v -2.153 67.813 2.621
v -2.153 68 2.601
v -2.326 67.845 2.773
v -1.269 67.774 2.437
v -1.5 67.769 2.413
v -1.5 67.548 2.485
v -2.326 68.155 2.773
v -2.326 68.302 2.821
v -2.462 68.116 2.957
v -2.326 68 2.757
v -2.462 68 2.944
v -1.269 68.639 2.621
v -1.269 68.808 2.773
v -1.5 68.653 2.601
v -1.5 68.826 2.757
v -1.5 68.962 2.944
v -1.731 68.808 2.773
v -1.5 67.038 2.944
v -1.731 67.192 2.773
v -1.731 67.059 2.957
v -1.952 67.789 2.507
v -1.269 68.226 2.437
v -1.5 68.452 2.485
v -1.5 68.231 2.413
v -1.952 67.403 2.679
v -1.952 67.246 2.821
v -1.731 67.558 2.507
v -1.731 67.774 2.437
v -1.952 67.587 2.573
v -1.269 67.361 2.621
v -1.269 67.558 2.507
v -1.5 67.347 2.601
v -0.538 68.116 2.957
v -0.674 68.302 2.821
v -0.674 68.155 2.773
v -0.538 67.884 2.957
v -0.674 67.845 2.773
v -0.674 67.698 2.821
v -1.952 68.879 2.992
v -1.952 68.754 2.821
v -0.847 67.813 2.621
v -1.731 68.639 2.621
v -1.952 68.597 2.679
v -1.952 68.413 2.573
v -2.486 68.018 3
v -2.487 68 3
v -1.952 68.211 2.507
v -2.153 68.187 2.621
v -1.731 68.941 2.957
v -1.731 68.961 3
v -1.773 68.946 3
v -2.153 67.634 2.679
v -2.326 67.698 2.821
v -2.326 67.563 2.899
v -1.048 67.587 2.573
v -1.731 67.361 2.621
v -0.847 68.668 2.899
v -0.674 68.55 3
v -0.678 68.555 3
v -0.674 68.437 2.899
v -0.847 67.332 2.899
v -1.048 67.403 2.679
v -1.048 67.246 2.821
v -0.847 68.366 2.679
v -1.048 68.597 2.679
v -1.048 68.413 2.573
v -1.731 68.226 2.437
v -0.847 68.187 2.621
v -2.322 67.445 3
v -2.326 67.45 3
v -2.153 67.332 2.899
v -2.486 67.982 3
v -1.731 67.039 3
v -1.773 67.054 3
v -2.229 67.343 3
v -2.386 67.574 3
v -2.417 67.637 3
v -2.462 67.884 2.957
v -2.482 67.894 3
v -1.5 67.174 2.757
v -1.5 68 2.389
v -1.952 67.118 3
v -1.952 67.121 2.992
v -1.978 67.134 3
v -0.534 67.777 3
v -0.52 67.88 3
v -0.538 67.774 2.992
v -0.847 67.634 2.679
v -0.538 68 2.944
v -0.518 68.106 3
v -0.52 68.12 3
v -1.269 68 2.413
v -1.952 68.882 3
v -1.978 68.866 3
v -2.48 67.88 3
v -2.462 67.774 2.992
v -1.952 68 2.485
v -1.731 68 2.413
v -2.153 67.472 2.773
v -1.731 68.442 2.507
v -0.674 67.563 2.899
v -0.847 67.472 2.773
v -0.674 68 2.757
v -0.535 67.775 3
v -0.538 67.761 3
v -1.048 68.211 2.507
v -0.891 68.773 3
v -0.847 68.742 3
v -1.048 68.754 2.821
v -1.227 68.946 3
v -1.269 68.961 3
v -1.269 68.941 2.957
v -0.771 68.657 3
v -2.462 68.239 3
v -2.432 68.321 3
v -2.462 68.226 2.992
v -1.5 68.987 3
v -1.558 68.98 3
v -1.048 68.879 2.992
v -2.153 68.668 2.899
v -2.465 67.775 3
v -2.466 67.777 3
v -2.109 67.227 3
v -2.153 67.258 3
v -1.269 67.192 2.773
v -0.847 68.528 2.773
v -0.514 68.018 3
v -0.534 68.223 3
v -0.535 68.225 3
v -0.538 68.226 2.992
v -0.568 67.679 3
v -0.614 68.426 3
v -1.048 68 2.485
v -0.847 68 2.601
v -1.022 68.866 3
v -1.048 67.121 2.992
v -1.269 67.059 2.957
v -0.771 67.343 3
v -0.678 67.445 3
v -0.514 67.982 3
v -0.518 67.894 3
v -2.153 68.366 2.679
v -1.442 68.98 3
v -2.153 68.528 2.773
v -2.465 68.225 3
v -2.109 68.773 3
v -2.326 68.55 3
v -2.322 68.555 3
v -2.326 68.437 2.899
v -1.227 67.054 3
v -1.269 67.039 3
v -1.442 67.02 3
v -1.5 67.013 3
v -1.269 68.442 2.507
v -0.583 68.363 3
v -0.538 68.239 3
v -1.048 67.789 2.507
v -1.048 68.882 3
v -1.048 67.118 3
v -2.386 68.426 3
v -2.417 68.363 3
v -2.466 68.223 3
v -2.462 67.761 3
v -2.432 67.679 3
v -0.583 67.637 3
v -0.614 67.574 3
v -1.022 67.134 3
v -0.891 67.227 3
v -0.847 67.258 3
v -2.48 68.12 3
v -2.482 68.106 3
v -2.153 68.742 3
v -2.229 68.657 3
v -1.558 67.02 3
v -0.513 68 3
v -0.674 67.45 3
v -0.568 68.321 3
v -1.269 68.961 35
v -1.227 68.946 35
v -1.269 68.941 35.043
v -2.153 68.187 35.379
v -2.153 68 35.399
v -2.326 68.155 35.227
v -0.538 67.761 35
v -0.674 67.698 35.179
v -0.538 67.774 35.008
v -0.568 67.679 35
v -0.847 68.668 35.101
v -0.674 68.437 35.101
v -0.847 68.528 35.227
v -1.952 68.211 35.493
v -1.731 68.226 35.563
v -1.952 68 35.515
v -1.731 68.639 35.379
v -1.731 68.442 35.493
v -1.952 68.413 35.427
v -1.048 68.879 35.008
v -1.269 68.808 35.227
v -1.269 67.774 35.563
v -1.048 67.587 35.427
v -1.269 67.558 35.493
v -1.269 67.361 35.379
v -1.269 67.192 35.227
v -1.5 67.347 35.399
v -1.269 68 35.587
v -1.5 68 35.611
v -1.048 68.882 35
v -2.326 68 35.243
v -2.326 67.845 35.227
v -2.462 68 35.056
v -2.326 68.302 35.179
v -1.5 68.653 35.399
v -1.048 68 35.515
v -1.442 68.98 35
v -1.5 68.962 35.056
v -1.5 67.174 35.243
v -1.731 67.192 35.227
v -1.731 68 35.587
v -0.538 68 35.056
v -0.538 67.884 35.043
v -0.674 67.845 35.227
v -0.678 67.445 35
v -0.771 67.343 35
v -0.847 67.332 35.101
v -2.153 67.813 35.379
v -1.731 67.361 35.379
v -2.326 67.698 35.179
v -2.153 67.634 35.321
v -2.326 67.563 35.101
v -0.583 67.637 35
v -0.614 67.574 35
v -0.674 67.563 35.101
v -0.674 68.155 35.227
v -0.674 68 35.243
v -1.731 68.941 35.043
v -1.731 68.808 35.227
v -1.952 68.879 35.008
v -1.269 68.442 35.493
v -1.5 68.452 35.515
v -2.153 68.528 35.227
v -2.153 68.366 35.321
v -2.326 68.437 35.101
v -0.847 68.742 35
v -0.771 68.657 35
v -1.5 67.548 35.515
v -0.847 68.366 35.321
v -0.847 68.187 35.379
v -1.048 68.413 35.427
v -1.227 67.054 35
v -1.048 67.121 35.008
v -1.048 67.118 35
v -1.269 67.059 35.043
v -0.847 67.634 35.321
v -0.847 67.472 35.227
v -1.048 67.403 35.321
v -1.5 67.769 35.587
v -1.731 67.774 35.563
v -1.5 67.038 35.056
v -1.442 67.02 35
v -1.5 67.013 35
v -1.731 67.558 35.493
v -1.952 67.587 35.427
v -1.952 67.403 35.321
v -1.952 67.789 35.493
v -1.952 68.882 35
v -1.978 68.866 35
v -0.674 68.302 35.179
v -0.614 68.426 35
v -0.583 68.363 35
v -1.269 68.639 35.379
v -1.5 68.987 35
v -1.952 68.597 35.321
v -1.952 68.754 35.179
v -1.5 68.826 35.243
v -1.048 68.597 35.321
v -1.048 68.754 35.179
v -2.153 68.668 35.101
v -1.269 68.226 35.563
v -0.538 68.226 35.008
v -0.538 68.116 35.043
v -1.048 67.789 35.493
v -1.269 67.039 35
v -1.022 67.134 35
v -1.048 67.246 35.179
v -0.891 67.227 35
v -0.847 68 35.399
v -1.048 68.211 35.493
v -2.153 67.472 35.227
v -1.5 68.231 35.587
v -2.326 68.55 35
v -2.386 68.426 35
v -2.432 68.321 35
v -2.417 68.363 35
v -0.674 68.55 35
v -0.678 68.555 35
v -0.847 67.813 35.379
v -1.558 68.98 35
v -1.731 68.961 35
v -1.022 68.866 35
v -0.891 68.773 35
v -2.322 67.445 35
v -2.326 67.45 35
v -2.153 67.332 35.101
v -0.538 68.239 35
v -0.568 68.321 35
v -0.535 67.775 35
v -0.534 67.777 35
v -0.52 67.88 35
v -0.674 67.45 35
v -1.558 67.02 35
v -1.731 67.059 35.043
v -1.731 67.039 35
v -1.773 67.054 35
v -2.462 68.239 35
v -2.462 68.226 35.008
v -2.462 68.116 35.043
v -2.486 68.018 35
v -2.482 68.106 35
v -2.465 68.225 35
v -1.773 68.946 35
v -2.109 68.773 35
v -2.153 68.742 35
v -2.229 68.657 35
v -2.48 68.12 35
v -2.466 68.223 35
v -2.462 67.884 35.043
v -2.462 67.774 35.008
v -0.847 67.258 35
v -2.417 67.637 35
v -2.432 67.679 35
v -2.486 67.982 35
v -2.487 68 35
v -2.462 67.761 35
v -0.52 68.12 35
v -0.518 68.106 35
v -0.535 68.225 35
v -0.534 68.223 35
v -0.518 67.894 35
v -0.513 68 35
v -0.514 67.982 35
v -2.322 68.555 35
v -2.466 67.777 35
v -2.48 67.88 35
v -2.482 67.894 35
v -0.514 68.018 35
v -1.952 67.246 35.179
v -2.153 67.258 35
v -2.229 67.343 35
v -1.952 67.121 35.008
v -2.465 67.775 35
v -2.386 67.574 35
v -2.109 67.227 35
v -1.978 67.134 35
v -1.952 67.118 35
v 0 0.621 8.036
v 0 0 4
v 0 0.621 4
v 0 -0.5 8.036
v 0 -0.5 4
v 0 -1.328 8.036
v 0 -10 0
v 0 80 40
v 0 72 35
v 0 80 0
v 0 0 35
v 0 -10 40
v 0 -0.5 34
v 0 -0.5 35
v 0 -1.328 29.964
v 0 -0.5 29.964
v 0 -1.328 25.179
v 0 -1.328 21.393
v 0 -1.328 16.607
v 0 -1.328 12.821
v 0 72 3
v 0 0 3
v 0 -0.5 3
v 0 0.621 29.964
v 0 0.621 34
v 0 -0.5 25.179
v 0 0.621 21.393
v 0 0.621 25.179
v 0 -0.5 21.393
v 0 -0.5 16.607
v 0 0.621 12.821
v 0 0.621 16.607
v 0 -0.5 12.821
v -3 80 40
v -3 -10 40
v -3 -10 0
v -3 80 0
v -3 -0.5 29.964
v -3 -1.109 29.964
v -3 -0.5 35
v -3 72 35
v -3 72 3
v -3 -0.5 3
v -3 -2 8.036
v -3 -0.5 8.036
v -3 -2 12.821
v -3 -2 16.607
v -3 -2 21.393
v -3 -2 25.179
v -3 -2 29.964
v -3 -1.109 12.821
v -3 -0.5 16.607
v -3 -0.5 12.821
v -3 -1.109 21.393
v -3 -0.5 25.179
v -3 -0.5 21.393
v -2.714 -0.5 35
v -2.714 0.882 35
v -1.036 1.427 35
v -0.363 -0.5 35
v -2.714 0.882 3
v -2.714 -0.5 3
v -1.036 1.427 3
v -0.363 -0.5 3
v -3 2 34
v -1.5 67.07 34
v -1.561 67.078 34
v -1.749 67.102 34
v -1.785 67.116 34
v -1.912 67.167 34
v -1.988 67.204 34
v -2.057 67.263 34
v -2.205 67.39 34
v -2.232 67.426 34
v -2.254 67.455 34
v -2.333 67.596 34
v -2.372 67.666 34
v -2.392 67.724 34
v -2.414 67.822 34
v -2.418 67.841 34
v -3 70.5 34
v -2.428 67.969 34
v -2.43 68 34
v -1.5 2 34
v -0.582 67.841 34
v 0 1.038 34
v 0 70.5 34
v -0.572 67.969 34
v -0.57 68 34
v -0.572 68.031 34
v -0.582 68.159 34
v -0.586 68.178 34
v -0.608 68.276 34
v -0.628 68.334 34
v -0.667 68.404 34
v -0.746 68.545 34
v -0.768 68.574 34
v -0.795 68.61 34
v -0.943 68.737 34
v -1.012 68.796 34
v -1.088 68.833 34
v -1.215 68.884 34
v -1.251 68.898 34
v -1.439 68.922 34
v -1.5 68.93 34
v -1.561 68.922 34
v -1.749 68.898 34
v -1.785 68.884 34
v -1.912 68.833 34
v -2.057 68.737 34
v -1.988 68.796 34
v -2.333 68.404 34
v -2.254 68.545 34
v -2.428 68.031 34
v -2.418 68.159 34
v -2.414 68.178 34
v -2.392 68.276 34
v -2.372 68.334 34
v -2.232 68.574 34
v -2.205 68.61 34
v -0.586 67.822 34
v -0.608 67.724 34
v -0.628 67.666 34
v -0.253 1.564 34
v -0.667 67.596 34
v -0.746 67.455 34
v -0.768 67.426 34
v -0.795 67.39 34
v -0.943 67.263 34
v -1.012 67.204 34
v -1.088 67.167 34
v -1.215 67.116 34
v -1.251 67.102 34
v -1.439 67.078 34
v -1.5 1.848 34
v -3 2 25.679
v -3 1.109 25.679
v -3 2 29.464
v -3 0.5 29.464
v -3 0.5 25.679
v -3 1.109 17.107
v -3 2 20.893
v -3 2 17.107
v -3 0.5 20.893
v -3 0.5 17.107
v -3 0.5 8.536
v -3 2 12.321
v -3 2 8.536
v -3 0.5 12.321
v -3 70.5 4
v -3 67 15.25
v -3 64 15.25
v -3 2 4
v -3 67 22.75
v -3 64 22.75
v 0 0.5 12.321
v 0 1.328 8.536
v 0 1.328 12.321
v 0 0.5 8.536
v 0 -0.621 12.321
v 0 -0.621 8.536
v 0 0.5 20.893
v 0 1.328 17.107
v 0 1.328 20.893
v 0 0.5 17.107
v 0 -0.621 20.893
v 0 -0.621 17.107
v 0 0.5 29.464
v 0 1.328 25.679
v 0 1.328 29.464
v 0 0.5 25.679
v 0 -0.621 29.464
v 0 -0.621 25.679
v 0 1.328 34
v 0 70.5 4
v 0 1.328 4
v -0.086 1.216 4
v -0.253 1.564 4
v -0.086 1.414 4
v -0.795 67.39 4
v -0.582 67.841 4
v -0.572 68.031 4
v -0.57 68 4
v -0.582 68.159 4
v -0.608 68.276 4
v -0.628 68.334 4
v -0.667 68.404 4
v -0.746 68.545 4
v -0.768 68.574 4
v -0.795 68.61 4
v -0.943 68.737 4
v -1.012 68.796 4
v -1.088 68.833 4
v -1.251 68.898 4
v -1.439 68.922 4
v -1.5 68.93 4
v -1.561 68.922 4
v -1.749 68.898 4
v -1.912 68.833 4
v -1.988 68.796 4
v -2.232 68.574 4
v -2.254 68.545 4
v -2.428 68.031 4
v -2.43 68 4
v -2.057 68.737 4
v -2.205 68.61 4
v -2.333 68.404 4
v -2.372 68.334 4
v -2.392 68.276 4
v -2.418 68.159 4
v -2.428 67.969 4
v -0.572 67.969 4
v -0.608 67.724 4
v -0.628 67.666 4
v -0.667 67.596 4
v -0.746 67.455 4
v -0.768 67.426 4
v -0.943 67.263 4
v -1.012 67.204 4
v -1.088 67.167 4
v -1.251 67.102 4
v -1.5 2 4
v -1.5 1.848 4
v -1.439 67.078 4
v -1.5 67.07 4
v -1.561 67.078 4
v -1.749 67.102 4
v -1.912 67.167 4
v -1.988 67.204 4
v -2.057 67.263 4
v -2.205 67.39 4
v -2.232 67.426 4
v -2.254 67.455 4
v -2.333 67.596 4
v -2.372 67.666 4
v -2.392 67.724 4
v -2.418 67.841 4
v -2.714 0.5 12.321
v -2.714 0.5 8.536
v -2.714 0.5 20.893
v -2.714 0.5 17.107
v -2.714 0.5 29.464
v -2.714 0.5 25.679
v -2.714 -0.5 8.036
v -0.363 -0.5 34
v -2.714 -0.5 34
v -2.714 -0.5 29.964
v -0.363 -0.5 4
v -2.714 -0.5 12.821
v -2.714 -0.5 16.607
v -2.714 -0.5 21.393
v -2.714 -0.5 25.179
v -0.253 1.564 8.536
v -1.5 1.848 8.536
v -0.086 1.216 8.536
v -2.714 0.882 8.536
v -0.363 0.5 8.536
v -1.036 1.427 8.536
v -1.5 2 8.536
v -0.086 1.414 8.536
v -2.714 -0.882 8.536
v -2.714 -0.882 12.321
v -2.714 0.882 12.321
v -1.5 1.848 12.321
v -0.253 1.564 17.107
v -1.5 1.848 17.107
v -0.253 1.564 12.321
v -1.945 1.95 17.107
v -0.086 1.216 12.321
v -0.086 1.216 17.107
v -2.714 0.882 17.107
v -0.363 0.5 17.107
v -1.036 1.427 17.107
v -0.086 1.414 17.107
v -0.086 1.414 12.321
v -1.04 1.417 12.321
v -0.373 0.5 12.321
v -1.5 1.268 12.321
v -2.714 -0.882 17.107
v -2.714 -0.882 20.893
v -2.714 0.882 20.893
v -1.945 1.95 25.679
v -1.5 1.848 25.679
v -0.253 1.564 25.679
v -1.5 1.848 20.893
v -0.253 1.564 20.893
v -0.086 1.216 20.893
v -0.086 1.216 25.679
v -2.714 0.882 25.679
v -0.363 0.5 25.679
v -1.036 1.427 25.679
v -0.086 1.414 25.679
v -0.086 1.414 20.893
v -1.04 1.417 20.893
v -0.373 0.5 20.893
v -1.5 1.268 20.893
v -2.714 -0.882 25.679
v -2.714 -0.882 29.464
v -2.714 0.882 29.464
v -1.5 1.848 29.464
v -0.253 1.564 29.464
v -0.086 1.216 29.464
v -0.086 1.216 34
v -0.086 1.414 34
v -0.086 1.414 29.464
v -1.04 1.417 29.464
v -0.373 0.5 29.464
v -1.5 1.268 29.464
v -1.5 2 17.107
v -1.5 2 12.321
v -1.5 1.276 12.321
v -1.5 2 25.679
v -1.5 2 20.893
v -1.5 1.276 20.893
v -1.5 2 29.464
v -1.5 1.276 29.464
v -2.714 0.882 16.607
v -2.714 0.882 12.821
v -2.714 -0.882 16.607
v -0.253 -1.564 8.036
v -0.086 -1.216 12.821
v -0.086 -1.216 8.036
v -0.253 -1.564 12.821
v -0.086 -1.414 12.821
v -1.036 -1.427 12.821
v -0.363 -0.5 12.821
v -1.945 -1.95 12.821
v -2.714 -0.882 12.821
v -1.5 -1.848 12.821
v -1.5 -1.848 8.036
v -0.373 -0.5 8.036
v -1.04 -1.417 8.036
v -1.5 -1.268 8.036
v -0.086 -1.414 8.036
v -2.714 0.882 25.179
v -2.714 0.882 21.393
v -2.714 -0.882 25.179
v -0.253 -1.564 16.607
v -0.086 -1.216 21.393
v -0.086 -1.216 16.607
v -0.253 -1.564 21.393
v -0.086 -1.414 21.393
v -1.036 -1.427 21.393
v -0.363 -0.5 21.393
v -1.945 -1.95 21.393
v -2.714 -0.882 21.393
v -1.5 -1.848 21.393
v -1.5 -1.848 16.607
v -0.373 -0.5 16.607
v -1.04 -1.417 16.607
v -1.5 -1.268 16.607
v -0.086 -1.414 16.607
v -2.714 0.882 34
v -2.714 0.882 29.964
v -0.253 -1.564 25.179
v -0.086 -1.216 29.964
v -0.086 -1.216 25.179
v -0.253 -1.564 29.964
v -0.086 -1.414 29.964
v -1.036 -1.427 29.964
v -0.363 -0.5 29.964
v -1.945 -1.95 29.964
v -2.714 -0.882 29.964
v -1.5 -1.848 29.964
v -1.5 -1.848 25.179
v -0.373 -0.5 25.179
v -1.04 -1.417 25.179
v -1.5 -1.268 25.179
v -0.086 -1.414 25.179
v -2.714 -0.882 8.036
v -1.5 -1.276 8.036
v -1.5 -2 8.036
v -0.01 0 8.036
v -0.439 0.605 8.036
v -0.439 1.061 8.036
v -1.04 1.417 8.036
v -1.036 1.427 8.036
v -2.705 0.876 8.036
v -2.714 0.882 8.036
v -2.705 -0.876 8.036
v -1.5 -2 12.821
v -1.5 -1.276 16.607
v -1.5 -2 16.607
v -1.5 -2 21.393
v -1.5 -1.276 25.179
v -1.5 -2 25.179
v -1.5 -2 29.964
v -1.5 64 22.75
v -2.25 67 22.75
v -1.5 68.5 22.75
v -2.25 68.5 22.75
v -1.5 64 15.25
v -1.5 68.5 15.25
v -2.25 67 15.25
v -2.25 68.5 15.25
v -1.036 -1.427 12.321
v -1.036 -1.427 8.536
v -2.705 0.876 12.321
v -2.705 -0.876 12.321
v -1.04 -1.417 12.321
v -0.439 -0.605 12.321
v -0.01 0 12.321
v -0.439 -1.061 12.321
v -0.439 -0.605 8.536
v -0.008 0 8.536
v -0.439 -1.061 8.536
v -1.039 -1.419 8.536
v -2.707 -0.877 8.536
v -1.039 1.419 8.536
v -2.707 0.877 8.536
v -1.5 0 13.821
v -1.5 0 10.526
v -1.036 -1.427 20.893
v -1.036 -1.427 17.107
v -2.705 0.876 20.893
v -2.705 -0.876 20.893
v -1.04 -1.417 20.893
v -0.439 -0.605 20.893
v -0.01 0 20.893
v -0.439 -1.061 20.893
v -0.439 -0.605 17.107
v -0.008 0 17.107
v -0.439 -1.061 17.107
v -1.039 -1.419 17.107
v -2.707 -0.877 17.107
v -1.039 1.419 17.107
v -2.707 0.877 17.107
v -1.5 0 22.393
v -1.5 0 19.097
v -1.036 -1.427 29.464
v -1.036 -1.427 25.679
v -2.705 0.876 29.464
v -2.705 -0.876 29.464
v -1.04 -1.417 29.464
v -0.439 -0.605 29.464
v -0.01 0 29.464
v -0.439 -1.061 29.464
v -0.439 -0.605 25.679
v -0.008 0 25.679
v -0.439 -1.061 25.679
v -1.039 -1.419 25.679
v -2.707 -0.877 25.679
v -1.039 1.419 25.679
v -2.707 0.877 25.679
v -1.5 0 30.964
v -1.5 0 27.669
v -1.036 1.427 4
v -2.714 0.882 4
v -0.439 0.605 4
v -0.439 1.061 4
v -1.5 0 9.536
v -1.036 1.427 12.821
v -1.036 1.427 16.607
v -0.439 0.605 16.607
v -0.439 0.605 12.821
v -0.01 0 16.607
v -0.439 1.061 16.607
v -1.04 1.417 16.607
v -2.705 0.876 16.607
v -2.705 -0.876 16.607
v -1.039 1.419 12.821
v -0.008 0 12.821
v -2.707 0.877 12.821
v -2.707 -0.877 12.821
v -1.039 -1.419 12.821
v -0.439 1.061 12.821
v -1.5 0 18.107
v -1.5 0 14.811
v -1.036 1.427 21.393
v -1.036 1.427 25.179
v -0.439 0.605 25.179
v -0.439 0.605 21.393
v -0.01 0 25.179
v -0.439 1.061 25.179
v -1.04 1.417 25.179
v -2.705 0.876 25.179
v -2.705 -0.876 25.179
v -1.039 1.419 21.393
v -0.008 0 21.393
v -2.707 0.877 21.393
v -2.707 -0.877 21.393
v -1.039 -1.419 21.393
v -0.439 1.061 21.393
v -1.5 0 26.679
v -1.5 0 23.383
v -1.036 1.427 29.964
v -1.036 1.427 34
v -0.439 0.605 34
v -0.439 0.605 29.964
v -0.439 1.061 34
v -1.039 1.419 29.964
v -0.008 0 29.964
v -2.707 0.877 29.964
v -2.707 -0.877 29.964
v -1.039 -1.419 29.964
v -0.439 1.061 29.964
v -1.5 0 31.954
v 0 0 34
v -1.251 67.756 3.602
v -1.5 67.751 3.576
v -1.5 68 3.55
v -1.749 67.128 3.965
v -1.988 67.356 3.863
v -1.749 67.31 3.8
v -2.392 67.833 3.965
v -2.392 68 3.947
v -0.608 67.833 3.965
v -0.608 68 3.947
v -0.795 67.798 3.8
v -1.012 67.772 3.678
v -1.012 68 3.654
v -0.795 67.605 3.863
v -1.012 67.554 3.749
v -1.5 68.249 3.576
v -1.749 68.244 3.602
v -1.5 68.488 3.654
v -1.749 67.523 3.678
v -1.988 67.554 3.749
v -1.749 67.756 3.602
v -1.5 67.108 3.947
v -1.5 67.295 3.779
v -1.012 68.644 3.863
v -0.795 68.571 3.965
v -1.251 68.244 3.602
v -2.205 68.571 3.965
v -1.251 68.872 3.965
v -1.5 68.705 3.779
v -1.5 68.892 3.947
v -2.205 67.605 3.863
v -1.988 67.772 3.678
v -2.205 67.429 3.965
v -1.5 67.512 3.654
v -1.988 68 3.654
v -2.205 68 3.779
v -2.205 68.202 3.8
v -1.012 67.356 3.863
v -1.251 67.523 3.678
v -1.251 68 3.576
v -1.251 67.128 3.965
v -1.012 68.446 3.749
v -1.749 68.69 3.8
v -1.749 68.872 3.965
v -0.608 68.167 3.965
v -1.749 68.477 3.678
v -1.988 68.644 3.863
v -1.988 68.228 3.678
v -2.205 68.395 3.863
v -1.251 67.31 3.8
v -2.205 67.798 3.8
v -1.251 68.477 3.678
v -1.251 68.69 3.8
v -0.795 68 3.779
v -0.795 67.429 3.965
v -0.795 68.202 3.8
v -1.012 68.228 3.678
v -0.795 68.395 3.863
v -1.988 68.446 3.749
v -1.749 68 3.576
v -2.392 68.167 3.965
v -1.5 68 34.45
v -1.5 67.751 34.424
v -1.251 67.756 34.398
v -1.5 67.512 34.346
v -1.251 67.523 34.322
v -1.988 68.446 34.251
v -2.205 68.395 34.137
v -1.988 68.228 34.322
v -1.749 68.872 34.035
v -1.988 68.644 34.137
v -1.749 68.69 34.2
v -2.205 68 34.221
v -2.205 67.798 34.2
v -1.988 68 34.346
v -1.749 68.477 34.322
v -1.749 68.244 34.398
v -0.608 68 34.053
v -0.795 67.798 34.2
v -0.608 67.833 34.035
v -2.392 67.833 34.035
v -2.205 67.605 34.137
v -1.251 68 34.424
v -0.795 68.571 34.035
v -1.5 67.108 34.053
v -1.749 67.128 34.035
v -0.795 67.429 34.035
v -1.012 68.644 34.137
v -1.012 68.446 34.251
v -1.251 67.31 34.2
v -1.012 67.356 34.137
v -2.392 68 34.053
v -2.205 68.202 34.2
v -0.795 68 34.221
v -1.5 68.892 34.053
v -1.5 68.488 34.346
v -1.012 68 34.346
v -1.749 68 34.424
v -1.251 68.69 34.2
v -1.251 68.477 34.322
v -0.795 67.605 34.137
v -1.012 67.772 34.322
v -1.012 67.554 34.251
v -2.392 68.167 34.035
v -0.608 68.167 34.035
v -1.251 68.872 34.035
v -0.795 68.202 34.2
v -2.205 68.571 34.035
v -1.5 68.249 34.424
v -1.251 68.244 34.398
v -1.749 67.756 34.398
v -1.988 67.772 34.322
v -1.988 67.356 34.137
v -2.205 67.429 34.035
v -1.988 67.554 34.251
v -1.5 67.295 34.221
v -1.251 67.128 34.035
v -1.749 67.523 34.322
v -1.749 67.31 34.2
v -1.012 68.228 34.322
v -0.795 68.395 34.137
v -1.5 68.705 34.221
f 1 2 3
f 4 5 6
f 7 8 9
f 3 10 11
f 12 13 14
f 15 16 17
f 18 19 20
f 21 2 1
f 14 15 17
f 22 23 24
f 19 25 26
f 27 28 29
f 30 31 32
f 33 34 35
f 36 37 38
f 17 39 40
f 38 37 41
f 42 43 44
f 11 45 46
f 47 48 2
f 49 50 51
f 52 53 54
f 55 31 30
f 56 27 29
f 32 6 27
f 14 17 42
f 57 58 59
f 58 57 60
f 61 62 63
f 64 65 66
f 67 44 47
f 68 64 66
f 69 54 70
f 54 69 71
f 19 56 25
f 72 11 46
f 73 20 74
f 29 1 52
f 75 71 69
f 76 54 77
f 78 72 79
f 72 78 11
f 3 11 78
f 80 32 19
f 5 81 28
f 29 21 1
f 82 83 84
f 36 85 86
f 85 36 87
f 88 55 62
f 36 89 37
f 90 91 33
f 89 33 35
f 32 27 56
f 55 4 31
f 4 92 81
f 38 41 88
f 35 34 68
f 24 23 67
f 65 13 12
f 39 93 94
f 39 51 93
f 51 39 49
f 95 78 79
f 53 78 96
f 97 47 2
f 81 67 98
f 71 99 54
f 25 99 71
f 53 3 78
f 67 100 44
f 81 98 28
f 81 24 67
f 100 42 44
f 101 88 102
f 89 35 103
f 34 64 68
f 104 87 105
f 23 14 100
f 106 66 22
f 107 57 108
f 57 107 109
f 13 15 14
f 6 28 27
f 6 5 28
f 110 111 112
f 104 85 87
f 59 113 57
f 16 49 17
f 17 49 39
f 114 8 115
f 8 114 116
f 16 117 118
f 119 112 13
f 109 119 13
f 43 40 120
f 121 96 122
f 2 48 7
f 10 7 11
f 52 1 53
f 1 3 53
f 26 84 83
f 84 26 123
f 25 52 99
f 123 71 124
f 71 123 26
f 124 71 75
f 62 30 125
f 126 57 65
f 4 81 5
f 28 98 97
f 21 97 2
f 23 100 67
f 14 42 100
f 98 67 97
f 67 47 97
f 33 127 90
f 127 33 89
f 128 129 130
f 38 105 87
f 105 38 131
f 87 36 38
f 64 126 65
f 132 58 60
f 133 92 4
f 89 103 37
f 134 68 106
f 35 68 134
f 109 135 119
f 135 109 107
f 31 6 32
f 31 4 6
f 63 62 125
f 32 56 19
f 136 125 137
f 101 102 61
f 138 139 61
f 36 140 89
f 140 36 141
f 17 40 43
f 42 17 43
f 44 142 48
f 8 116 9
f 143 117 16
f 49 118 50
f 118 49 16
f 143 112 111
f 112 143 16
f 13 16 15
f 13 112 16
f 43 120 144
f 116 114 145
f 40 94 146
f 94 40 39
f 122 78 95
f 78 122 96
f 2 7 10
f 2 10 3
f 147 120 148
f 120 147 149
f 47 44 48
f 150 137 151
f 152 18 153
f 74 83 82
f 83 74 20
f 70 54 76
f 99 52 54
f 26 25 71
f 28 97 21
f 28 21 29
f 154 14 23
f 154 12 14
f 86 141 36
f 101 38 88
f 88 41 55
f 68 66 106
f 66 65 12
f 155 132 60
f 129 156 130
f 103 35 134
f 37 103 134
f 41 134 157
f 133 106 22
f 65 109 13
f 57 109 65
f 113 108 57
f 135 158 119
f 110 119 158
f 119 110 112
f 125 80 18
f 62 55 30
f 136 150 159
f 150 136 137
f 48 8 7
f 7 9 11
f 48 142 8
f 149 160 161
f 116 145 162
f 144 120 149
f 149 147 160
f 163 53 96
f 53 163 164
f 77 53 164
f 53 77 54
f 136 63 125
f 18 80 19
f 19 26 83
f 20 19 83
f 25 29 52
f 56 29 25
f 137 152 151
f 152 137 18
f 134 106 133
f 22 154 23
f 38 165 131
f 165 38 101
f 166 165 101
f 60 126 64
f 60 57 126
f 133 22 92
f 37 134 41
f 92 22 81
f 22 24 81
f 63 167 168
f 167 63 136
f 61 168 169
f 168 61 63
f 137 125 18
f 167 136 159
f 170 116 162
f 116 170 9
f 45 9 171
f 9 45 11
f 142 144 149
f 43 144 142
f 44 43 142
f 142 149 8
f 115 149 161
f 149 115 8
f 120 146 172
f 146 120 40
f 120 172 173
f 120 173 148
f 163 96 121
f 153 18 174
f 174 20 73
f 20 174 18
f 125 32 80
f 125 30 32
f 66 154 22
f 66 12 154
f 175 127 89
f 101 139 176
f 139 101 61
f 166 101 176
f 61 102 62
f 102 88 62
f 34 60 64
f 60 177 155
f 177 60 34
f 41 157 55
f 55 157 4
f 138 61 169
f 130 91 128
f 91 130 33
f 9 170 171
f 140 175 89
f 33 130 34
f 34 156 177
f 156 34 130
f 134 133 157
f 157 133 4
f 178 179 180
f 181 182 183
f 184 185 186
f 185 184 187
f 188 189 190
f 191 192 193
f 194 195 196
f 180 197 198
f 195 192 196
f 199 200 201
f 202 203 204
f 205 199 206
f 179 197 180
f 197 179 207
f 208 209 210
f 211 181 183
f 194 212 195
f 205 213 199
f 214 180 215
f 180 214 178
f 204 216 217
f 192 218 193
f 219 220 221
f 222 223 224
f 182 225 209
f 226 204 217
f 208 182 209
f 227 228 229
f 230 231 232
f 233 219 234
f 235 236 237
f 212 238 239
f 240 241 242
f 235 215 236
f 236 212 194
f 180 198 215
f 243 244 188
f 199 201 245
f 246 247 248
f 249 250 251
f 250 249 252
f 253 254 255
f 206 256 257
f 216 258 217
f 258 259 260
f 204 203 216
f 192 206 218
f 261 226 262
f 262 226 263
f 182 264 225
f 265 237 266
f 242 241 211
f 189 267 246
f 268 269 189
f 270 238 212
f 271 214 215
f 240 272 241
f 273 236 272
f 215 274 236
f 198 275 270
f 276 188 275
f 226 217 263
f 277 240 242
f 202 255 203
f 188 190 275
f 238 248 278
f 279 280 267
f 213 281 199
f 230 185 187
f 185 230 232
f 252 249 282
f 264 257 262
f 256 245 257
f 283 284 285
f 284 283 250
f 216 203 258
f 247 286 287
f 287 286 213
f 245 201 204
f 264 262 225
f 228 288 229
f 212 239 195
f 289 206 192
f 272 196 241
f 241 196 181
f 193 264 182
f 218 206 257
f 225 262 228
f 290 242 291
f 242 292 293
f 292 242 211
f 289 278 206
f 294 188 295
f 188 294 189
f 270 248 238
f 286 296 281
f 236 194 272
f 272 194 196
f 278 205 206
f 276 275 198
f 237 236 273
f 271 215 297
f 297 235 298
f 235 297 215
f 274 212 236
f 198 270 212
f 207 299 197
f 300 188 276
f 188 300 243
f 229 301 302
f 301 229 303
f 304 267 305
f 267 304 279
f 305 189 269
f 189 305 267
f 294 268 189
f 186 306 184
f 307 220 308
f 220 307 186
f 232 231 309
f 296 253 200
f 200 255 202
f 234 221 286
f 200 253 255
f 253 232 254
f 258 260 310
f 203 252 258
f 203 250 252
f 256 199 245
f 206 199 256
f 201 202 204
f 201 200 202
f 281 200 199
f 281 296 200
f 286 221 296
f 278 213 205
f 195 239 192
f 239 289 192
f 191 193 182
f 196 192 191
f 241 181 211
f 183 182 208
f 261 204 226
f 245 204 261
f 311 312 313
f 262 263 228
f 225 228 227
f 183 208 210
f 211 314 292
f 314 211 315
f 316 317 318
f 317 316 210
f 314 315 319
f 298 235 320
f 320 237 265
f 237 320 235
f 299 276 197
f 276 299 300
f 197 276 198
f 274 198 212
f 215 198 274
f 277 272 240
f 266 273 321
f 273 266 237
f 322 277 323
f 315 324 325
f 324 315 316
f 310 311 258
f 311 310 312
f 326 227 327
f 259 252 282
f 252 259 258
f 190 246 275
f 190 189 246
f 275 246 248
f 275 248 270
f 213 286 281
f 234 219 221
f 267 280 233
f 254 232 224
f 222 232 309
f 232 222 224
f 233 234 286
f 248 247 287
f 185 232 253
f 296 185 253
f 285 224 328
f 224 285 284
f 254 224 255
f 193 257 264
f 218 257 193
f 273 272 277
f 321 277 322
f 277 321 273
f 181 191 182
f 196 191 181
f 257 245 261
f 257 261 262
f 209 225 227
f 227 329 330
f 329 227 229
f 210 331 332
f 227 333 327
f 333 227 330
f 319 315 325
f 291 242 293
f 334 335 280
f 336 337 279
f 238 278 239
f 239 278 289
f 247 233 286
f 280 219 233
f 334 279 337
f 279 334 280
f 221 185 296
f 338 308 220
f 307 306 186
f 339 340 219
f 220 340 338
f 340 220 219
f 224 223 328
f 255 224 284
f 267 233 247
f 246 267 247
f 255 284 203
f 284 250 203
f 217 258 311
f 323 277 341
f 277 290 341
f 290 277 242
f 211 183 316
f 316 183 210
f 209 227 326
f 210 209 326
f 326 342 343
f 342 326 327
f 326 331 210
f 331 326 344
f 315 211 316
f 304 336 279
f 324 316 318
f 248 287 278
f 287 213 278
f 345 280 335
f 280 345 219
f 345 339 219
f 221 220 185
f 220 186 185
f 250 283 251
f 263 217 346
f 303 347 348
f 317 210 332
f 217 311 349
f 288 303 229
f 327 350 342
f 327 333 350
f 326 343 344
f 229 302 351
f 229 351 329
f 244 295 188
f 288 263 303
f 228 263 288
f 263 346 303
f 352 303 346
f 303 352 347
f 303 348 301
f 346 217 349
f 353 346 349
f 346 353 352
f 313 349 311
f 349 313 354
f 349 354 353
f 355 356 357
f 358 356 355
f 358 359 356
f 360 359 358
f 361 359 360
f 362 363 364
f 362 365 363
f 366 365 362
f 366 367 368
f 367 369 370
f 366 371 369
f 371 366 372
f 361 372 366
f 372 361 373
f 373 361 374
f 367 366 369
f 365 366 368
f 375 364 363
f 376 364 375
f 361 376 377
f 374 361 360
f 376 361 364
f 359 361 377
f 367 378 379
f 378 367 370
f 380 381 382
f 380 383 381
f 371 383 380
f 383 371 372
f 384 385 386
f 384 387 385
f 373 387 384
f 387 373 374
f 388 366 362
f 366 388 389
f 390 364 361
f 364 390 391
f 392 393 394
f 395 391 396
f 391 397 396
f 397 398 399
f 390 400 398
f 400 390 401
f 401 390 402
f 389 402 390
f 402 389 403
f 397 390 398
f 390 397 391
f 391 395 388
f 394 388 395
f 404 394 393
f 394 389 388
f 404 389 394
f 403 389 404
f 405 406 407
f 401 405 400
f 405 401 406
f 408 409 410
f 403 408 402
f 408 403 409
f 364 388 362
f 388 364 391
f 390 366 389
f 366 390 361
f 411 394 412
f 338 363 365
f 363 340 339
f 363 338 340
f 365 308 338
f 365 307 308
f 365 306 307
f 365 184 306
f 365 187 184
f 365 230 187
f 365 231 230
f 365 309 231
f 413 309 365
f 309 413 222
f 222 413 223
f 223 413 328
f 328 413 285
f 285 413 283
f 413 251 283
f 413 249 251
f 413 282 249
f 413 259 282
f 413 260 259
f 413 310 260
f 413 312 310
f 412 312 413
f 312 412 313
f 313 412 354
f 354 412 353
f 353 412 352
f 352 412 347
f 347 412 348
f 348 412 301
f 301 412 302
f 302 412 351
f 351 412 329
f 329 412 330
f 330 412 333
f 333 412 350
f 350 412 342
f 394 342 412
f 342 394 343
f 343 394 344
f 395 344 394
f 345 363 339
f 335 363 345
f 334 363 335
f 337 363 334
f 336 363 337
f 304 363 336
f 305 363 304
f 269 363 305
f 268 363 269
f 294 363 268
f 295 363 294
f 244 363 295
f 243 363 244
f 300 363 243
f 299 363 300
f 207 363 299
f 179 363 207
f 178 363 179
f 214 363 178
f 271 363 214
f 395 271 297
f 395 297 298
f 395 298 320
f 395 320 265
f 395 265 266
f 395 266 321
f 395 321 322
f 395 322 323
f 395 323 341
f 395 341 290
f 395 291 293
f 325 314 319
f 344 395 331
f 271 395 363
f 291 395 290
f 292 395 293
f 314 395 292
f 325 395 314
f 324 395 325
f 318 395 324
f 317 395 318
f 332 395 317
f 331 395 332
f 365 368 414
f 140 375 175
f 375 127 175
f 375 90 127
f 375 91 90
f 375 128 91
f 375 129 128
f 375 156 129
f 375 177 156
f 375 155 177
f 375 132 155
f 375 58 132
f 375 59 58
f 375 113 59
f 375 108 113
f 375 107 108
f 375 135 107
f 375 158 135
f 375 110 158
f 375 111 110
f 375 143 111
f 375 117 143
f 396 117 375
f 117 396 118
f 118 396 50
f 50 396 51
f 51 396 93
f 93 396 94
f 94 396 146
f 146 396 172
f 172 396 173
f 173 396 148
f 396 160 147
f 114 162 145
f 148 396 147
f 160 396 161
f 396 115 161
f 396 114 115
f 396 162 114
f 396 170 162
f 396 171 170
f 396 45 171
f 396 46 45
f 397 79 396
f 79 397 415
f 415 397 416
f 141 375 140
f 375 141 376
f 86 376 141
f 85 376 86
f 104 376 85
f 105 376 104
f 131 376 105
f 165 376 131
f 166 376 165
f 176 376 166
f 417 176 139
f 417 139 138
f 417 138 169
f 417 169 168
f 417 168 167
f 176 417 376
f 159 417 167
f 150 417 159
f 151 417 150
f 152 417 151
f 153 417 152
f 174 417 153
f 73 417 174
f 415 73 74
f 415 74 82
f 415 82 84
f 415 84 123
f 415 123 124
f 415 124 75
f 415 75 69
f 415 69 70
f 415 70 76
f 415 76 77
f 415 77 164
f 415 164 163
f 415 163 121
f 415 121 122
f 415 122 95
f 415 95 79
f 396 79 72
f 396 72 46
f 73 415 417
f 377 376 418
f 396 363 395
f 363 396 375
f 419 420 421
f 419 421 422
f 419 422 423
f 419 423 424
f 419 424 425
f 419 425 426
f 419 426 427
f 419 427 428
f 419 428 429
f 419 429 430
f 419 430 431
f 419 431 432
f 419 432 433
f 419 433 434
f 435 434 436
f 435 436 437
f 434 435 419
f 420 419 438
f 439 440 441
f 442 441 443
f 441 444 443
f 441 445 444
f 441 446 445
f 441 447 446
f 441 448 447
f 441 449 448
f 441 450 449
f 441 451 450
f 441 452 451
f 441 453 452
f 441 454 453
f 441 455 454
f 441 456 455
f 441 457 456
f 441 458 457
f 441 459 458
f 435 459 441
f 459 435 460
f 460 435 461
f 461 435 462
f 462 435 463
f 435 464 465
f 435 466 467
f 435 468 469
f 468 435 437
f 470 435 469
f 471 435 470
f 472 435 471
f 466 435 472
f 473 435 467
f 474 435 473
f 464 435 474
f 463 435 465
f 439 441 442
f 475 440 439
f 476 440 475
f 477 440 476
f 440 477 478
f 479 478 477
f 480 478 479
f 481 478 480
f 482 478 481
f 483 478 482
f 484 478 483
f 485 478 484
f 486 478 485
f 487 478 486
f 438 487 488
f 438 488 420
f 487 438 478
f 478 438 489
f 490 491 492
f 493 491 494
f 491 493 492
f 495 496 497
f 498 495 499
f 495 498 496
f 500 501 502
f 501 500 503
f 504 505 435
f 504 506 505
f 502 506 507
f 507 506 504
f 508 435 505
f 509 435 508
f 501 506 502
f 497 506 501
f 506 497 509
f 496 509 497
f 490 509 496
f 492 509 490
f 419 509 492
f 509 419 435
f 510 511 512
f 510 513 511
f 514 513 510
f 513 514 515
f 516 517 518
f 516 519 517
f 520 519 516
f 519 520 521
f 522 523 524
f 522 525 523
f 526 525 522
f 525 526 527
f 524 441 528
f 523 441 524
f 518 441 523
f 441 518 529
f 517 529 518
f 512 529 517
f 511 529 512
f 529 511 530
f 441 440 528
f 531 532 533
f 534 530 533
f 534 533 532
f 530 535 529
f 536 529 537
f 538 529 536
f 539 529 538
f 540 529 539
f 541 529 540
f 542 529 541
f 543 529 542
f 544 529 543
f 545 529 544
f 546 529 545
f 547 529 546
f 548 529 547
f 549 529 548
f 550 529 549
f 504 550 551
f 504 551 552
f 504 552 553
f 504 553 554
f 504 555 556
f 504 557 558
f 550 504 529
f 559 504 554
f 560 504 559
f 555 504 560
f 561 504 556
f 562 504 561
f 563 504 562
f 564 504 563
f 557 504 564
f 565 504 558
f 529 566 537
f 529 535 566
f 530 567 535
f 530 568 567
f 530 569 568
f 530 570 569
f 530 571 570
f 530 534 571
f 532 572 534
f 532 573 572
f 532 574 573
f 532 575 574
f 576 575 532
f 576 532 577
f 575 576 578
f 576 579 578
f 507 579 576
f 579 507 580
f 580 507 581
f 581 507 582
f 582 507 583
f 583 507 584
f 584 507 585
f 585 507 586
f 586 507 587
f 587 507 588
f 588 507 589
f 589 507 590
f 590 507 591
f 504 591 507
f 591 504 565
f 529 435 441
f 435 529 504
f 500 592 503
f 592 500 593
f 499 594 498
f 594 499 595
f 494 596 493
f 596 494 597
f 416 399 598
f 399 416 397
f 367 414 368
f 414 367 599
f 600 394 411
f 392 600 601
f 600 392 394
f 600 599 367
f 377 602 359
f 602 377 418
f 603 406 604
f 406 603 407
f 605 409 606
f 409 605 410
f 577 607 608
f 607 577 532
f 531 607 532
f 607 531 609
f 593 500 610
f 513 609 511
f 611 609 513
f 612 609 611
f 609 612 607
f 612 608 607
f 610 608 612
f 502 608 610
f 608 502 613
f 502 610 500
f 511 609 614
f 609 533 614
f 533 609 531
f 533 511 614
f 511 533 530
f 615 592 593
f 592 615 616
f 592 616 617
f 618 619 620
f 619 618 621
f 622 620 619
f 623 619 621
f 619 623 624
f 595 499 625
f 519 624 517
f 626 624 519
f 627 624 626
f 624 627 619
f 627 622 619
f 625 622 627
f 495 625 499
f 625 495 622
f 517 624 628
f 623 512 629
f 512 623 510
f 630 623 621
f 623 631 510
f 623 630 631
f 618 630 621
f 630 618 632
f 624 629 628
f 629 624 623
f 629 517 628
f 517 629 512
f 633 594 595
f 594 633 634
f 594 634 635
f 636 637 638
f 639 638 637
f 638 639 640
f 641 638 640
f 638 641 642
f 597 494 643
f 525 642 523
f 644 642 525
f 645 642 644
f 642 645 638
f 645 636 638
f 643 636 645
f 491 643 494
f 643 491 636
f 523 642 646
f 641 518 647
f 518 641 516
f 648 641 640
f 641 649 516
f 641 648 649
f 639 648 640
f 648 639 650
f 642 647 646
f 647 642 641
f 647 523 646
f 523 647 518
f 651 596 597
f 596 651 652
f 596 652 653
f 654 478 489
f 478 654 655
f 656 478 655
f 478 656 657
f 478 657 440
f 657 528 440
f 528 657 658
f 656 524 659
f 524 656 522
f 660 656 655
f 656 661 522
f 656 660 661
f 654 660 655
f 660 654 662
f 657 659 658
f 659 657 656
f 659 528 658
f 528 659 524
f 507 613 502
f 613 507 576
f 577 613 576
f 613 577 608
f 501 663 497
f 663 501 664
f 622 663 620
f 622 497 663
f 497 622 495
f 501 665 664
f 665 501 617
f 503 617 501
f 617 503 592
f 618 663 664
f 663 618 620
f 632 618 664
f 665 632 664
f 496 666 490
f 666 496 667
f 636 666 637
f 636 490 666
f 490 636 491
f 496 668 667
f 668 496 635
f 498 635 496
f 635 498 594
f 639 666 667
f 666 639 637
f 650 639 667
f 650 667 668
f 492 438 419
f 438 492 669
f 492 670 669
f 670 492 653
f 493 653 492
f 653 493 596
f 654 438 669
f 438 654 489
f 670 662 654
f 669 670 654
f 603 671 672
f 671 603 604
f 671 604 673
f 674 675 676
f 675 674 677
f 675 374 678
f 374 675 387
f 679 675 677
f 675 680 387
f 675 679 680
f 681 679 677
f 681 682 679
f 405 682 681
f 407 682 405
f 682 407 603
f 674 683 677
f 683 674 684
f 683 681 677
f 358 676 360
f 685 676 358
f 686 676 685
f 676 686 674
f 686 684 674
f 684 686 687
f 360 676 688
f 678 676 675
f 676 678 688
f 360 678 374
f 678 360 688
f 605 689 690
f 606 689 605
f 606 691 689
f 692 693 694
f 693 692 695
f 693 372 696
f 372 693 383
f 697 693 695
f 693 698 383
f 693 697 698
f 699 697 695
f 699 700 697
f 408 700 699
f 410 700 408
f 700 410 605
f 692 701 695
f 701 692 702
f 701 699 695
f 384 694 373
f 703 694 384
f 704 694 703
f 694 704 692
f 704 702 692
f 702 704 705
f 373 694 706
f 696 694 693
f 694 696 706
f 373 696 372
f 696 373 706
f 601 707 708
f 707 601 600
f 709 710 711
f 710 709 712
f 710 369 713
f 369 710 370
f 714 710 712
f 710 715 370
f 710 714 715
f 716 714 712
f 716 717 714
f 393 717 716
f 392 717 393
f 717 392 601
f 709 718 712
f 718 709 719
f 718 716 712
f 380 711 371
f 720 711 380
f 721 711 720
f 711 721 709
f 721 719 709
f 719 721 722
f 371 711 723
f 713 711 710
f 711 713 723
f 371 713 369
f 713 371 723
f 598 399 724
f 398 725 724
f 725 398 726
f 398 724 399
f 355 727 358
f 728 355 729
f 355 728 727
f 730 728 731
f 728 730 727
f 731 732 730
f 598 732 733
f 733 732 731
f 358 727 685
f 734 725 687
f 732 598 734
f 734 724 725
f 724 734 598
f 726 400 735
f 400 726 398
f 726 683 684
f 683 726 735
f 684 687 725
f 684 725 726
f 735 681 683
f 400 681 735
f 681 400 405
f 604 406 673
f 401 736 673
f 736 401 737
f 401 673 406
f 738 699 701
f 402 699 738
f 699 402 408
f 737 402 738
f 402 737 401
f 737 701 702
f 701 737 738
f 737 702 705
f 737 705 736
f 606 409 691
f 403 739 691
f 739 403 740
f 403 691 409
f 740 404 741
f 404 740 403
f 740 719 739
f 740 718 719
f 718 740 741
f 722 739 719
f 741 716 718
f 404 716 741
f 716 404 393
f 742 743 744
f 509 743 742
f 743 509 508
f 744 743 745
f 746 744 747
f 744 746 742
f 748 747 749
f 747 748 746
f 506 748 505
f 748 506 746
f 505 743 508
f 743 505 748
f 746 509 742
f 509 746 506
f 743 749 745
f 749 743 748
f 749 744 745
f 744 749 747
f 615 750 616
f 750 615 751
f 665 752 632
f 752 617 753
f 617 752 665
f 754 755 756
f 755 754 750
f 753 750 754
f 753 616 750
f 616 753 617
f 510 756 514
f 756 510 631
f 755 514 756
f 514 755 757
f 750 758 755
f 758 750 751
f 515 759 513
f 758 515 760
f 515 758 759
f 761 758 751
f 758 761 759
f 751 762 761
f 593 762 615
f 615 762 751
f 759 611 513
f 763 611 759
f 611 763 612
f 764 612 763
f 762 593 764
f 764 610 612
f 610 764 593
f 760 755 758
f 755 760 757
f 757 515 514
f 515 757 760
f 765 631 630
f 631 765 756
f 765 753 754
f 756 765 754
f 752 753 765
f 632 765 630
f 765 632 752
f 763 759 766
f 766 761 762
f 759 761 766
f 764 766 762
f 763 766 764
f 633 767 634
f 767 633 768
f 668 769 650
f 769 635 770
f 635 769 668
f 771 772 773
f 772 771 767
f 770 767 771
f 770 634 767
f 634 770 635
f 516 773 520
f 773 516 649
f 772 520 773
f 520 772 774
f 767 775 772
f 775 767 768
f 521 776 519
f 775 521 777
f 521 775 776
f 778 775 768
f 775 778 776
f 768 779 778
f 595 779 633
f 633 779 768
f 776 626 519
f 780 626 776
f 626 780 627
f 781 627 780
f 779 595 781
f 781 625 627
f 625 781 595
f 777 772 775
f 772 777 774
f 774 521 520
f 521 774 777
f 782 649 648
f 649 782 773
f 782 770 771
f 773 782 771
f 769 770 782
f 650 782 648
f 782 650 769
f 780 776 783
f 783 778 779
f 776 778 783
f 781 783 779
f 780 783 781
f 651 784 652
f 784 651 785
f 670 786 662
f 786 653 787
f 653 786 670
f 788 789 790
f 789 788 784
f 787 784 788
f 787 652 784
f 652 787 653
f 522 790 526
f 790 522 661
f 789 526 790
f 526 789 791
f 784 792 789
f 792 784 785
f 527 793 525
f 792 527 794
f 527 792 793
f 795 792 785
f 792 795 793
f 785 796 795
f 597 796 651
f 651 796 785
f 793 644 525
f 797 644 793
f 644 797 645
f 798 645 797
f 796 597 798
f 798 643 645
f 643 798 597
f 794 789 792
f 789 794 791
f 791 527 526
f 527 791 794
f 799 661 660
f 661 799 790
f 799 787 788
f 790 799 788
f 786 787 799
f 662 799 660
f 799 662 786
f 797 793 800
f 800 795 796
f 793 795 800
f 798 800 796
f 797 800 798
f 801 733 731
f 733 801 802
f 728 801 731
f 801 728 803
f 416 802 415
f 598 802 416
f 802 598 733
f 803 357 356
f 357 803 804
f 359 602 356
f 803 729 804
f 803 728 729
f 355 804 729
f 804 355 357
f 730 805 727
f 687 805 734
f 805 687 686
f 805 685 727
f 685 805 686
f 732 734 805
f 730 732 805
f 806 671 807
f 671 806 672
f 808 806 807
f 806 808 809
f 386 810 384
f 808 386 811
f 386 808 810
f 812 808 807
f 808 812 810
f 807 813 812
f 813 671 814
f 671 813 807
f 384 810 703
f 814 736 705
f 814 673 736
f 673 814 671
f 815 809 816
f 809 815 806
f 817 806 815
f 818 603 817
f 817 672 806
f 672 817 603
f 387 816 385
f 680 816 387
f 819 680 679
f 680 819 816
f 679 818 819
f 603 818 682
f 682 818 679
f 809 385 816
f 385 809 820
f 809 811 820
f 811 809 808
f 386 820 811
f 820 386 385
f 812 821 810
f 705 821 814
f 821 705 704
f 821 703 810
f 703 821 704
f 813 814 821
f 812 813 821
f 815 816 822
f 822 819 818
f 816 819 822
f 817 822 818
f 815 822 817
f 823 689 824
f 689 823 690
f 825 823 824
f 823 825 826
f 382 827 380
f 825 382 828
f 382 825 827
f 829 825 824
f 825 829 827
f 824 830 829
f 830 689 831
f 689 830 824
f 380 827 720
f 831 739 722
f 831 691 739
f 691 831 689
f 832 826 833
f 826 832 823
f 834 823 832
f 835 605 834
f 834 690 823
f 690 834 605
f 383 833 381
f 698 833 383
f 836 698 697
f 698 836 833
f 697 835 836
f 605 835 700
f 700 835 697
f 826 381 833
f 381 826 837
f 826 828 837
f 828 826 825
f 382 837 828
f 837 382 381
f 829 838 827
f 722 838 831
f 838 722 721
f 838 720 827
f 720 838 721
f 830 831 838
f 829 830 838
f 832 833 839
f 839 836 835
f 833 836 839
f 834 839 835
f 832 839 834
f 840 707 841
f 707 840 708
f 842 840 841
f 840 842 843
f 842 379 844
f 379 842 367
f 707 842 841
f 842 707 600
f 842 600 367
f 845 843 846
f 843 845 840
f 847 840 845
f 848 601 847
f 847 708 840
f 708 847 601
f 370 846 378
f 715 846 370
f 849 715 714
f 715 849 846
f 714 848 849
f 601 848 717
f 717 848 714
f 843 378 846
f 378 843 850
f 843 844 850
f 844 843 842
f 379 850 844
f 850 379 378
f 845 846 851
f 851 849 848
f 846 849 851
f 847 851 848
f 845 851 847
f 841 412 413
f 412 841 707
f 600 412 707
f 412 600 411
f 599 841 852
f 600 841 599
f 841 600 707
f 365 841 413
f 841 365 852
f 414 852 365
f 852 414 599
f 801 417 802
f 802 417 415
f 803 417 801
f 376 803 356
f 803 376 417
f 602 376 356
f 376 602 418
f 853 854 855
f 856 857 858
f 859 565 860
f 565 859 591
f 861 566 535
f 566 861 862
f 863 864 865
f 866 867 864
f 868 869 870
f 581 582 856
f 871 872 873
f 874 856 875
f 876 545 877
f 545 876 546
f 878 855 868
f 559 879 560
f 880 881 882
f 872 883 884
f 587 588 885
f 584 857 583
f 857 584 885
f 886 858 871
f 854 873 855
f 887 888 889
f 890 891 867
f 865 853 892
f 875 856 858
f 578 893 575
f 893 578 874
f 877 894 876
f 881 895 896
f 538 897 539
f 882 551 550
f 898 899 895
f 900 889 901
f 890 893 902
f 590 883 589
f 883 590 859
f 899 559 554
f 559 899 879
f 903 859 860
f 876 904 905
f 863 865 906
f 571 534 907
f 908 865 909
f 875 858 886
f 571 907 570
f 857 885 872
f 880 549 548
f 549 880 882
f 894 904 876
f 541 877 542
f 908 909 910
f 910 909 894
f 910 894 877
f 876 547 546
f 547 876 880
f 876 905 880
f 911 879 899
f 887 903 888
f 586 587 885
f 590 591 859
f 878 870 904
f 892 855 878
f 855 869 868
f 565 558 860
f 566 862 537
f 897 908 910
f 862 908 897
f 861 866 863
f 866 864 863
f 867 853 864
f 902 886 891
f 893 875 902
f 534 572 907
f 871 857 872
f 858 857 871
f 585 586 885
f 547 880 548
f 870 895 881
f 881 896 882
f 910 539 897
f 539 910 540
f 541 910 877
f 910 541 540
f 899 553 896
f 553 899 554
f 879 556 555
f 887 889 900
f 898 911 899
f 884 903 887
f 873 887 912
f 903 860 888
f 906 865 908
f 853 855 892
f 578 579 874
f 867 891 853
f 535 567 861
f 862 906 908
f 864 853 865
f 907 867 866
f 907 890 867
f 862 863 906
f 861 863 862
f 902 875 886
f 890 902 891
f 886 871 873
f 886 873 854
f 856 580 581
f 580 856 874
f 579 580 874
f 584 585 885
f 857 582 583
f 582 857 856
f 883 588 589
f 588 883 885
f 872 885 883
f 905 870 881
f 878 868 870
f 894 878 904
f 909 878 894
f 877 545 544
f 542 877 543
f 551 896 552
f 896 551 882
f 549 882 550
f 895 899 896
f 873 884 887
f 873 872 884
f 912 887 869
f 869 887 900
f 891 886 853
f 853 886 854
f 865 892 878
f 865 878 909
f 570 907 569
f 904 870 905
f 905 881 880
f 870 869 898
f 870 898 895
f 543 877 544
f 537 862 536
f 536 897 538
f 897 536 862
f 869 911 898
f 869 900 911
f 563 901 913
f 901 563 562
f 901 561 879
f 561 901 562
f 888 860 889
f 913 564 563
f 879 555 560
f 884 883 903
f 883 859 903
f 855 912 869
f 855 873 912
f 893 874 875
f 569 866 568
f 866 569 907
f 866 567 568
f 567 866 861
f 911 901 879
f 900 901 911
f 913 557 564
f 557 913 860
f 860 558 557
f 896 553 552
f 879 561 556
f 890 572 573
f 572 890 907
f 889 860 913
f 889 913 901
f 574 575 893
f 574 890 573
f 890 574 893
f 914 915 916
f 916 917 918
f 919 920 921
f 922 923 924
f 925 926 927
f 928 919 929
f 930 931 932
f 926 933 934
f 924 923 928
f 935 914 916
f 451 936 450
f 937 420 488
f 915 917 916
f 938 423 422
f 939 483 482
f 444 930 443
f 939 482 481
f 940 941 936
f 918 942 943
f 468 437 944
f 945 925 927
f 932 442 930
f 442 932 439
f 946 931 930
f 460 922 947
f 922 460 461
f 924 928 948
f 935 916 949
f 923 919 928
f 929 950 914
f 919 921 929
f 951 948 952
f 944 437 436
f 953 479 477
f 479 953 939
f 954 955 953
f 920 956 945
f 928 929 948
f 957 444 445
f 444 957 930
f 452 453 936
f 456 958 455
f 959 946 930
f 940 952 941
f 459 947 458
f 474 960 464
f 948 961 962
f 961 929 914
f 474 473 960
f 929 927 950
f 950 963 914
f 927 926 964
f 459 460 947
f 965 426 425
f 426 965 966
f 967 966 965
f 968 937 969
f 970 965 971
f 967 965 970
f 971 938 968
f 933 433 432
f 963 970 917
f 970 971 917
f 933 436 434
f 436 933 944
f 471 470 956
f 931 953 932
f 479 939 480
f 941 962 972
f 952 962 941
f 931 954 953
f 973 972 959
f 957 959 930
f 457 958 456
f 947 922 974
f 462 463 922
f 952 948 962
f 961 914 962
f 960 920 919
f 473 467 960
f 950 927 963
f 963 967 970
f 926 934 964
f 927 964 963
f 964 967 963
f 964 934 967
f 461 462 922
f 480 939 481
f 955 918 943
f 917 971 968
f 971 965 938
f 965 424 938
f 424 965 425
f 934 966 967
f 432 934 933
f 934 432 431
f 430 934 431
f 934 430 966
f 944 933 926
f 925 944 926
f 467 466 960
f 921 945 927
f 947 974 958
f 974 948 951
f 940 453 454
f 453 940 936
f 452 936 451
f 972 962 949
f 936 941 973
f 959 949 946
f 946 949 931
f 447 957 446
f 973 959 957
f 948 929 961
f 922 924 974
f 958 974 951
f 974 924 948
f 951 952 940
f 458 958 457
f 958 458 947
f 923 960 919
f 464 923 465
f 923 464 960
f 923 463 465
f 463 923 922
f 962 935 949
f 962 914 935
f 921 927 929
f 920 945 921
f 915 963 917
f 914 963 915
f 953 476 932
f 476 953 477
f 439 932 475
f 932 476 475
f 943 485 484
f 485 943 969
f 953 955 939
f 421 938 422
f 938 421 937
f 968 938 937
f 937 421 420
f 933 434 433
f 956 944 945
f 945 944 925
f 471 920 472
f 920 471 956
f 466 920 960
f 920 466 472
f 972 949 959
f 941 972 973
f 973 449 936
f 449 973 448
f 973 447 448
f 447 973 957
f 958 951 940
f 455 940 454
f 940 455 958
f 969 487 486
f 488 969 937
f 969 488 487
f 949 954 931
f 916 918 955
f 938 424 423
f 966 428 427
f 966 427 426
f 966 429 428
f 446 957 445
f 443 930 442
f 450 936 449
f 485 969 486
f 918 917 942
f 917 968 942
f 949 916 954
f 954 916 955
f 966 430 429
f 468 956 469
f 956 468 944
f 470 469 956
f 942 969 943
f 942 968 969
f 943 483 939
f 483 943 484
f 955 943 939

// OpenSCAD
include <hinge.scad>;


difference() {
    translate([-3,-10,0])
    cube([3,90,40]);
    translate([-3,-18,3])
    cube([3,90,32]);
    
    translate([0,0,4])
    rotate([0,270])
    hinge_door_slot(70,30);
}
    translate([0,0,4])
    rotate([0,270])
    hinge_door(70,30,7);
